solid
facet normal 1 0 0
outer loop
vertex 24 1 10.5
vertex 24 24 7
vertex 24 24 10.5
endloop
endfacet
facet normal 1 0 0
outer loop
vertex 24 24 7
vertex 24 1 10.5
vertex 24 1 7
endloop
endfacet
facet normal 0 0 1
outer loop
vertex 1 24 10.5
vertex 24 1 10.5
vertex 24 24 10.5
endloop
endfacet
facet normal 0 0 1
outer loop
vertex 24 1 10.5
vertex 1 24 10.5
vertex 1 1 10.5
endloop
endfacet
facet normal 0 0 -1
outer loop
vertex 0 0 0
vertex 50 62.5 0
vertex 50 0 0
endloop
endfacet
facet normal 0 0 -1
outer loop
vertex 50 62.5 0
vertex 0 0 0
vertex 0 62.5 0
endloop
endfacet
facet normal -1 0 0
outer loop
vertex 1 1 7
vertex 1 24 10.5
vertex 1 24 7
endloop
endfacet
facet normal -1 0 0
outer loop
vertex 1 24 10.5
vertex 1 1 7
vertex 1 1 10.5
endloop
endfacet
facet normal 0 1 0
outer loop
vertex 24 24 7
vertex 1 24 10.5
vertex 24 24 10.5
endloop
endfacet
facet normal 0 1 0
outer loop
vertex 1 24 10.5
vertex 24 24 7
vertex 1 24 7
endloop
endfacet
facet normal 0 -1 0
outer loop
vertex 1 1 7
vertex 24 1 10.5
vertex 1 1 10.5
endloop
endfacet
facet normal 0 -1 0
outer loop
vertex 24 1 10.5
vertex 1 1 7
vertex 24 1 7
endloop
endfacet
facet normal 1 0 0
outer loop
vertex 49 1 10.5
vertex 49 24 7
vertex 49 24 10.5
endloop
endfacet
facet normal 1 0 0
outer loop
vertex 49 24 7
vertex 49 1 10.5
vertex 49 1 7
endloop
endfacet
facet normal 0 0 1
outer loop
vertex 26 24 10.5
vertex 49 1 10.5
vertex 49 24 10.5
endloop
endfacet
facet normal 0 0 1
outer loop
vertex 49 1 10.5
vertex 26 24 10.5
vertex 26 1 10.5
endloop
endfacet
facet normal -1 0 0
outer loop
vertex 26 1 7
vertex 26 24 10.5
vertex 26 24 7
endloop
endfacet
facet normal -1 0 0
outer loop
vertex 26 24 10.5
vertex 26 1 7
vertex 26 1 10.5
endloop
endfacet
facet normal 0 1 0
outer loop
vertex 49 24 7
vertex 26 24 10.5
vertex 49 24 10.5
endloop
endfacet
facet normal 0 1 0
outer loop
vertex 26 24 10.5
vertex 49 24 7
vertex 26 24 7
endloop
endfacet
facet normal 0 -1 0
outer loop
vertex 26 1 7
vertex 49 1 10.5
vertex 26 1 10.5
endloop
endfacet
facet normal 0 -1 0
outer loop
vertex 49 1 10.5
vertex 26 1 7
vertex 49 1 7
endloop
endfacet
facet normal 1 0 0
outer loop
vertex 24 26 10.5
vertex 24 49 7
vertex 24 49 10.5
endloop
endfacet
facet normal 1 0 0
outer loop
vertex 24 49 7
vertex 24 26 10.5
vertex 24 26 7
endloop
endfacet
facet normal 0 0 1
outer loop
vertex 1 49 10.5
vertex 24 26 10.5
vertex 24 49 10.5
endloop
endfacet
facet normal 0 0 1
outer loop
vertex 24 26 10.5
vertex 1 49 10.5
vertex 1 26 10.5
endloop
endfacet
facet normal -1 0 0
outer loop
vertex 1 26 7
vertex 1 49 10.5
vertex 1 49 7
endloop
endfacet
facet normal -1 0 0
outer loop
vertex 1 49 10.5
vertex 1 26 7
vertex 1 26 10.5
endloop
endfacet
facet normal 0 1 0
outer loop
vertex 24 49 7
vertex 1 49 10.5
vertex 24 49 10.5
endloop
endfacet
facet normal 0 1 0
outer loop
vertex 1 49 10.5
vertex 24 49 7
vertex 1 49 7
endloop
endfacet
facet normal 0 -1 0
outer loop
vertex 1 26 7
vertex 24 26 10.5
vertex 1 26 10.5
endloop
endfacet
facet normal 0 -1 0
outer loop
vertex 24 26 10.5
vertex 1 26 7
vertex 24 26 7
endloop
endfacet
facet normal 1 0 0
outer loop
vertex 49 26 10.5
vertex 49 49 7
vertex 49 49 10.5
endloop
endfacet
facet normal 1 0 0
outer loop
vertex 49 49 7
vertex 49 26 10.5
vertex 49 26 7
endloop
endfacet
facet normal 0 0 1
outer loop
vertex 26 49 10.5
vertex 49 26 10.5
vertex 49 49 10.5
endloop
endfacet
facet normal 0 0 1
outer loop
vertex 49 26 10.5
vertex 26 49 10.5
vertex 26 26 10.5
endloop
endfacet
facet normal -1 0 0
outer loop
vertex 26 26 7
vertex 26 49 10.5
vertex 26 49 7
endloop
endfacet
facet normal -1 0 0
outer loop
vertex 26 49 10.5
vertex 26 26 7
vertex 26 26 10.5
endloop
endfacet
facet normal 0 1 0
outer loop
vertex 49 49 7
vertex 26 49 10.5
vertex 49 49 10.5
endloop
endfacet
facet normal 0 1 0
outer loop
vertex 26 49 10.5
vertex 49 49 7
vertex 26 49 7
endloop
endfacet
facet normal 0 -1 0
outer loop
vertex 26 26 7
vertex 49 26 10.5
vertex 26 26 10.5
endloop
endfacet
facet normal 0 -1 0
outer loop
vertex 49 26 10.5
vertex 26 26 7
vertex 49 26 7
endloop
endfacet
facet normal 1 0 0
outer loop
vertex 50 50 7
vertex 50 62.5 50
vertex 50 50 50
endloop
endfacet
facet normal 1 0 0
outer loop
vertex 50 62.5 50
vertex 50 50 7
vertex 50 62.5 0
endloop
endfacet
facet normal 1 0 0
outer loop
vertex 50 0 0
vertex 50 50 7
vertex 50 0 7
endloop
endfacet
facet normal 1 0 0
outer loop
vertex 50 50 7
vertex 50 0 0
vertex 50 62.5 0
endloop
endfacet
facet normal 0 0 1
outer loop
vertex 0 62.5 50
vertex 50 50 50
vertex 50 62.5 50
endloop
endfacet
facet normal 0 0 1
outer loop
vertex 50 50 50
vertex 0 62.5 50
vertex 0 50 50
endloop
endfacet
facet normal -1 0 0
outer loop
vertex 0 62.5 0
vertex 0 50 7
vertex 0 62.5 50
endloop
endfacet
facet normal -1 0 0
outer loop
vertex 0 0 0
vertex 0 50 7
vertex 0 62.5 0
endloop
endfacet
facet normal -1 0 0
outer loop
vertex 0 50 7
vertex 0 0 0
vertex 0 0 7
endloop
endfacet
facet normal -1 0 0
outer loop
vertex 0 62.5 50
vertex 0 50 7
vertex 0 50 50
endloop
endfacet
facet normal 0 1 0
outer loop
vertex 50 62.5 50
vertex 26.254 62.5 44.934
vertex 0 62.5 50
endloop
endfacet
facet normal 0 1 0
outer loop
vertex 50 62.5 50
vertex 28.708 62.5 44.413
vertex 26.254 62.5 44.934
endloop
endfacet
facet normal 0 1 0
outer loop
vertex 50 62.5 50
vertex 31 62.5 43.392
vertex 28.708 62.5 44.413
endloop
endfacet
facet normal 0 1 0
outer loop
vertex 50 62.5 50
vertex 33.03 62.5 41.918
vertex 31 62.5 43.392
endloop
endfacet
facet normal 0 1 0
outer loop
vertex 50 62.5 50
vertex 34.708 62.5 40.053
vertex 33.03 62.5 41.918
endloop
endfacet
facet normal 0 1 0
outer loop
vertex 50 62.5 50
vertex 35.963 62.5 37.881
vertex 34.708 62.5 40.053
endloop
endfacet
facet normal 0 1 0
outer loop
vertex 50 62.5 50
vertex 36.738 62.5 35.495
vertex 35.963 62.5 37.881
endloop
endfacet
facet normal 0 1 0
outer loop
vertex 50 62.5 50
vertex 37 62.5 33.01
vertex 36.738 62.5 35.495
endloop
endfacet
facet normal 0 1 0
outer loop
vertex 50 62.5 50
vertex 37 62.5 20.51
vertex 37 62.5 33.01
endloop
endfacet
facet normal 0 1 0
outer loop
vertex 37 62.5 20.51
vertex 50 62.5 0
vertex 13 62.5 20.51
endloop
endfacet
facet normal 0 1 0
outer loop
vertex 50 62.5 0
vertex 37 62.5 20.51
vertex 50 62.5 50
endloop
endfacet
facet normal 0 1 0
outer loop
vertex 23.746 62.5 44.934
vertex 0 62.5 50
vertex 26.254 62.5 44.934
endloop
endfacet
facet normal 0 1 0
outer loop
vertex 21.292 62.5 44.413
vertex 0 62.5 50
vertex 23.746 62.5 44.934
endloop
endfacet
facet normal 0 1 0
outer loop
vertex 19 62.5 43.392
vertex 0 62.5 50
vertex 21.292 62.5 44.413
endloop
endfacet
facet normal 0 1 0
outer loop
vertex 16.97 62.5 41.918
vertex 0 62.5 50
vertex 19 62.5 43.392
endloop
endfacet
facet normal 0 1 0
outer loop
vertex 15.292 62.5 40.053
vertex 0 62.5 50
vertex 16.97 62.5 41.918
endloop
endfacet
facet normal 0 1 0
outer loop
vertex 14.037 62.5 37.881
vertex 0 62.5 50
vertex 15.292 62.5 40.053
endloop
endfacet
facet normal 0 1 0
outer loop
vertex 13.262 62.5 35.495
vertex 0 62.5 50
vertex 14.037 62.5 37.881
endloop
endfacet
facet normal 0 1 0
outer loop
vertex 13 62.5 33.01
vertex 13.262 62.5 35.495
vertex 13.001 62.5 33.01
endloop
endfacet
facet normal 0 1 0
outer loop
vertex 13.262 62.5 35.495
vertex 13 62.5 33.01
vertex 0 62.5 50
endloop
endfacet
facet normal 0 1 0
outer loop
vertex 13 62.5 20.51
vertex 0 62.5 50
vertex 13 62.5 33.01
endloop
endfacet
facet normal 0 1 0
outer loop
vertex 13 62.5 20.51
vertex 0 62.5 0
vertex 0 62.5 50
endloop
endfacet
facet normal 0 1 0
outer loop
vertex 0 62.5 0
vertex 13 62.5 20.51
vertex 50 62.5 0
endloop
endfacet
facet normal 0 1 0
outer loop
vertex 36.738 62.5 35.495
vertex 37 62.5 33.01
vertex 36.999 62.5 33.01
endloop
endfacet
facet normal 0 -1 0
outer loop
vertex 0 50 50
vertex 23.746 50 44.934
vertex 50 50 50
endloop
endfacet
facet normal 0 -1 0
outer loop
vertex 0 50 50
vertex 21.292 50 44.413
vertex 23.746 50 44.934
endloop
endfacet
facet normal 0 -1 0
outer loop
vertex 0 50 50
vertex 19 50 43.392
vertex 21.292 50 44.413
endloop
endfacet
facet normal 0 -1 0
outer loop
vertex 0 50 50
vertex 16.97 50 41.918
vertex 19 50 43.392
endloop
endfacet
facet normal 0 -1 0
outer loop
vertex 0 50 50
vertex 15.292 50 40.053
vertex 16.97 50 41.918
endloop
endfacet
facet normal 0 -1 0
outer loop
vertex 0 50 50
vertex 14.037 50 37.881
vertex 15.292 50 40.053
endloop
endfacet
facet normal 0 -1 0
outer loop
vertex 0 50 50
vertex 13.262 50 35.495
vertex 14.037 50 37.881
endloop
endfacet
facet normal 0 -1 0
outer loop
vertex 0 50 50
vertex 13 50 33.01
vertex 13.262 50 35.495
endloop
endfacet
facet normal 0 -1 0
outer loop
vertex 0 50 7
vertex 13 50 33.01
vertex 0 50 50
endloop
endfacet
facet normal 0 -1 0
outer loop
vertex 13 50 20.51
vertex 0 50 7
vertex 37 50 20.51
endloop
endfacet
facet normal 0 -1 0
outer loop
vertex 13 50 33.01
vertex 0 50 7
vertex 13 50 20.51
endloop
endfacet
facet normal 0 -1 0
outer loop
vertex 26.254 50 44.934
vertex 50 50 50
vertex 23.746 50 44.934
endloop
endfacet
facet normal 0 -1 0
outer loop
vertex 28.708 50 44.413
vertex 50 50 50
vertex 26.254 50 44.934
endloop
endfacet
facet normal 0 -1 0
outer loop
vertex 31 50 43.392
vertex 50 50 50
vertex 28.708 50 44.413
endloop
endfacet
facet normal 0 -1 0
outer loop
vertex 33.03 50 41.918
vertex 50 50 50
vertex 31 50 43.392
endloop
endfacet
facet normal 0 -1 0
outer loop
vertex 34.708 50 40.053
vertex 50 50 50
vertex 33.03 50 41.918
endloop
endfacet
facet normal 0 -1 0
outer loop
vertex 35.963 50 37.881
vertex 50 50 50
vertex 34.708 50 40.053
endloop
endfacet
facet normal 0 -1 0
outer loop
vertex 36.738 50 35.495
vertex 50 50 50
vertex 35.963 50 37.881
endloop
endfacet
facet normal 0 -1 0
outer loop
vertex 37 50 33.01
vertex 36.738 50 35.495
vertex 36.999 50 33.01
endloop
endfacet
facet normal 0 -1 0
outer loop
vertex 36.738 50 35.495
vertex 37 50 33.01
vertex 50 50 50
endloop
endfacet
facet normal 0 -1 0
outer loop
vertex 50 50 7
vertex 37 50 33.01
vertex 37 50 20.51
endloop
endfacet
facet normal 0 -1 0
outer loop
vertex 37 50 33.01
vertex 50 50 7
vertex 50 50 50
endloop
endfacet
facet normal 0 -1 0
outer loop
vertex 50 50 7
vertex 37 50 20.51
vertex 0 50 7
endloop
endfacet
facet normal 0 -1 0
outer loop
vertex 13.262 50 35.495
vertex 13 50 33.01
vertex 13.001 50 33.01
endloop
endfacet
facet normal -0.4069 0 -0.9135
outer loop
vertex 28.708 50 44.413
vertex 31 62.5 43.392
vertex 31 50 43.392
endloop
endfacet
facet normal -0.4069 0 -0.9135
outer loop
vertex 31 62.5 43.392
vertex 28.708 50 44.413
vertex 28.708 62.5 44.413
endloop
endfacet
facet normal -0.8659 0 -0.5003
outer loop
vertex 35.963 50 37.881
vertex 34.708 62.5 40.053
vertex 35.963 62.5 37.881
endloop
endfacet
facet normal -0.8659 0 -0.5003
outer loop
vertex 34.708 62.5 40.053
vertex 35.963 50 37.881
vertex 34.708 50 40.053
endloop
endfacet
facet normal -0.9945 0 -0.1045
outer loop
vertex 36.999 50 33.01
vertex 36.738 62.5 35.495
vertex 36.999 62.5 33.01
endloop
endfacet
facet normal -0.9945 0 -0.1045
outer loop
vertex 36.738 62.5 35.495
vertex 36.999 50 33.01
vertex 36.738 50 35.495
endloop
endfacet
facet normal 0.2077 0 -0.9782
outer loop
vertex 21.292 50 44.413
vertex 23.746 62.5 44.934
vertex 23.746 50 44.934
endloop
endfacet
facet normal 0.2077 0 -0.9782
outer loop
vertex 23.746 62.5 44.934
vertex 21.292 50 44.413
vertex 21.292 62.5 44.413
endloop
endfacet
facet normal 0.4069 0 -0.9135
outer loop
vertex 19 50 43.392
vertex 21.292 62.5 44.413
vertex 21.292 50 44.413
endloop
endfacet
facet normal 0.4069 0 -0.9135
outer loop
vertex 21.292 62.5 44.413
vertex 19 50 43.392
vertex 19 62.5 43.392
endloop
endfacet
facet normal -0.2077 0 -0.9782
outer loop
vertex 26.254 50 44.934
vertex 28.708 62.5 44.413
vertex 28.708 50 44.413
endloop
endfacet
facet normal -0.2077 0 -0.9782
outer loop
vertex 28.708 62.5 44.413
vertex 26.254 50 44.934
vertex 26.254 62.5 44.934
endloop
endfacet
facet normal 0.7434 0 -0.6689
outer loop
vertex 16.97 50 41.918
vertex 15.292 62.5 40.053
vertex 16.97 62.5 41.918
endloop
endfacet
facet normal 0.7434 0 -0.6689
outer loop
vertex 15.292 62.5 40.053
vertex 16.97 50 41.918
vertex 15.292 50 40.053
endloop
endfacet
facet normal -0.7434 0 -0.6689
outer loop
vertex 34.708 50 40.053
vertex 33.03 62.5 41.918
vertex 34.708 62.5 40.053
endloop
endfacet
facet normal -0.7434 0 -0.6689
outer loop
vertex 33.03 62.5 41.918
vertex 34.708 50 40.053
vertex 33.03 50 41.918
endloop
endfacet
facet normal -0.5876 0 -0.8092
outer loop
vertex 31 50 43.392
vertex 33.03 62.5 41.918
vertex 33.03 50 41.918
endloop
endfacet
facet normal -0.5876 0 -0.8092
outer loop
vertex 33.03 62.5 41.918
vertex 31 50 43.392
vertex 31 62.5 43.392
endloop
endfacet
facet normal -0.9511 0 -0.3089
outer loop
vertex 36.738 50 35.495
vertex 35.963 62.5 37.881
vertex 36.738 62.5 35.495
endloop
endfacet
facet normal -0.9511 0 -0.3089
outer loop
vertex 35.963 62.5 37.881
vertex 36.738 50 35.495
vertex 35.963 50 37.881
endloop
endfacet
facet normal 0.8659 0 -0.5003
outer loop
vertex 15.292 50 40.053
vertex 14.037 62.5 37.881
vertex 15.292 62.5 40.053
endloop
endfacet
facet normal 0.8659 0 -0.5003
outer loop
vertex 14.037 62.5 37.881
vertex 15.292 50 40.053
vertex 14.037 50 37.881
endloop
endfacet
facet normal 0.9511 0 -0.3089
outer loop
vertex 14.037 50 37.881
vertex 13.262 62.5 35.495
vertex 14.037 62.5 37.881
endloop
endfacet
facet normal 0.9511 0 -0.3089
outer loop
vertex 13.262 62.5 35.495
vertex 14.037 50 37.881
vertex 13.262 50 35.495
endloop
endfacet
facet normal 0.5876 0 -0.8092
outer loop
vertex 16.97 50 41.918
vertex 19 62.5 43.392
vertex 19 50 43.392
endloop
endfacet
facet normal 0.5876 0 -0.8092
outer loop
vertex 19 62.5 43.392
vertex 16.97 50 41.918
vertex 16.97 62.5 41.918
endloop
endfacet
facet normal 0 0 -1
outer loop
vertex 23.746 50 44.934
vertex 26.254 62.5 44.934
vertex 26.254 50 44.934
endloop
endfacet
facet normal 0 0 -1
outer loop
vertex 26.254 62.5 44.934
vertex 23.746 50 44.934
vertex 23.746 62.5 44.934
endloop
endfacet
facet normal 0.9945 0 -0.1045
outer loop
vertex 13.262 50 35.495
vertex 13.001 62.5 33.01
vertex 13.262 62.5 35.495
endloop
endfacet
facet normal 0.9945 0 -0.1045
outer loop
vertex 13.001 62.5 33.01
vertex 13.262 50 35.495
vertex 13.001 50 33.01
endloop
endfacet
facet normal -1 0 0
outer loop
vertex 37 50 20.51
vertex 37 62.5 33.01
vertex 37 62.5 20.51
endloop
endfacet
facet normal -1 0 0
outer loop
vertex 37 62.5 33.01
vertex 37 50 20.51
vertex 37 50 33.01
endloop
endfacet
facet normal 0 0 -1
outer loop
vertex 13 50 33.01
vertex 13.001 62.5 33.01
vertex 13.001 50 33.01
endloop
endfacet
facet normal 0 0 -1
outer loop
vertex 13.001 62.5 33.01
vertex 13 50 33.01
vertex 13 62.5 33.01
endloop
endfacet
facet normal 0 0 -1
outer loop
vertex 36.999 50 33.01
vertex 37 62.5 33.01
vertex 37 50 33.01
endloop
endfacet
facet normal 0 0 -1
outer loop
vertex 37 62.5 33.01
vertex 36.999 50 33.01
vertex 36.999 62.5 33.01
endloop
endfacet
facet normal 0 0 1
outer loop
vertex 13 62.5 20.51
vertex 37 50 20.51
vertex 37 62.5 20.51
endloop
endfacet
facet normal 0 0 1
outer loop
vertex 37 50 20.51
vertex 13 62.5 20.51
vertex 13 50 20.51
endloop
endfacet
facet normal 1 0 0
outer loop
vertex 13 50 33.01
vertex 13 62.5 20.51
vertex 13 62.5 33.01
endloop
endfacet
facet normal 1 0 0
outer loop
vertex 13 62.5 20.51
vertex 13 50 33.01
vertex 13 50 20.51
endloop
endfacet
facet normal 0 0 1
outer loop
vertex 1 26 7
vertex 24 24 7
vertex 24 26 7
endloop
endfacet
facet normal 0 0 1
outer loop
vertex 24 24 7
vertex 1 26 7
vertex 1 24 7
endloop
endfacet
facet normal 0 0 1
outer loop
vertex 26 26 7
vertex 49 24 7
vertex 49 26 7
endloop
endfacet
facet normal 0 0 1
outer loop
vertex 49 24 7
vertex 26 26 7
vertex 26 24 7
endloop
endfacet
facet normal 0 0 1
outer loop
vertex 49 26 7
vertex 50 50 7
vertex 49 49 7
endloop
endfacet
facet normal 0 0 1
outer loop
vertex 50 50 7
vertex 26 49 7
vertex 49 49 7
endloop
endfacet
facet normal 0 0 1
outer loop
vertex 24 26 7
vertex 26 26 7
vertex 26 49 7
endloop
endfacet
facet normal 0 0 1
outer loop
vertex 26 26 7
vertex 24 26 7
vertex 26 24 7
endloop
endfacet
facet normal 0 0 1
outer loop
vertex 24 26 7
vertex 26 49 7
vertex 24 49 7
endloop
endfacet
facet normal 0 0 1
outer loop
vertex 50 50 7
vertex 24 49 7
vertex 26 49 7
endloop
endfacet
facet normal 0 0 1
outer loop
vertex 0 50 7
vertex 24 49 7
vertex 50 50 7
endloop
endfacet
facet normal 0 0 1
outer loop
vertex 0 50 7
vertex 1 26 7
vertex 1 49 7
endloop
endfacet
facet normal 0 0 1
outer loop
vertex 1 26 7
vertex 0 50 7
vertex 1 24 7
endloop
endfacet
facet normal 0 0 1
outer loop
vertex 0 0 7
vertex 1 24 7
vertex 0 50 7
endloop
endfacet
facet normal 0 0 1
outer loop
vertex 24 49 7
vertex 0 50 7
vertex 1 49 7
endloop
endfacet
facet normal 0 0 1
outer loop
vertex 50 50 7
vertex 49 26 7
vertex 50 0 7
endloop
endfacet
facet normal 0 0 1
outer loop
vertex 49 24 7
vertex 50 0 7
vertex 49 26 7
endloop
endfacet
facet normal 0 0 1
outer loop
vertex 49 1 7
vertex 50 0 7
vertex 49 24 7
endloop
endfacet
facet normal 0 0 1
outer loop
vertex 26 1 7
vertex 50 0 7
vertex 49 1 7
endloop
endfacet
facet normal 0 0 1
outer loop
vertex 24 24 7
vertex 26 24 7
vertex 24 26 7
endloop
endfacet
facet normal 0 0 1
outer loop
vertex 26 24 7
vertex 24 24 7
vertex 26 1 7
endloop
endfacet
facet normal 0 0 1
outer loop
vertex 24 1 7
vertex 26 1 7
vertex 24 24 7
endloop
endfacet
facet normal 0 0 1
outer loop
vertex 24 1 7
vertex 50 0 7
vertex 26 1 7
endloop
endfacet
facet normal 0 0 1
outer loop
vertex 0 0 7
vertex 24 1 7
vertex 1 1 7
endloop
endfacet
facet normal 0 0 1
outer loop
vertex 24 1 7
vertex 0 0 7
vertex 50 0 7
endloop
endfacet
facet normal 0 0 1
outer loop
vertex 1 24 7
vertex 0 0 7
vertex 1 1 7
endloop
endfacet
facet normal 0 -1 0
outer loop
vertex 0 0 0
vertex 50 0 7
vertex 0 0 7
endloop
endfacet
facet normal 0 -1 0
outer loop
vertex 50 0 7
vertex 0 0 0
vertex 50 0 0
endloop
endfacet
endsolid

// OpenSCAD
color("LightGray") {
    translate([1,1,0]) cube([23,23,6+4.5]);
    translate([25+1,1,0]) cube([23,23,6+4.5]);
    translate([1,25+1,0]) cube([23,23,6+4.5]);
    translate([25+1,25+1,0]) cube([23,23,6+4.5]);
}
color("Grey") {
    cube([50,50,6+1]);
    difference() {
        translate([0,50,0]) cube([50,12.5,50]);
        translate([25,25,6+27]) rotate([-90,0,0]) cylinder(50,12,12);
        translate([13,25,6+4.51+10]) cube([24,50,27-4.5-10]);
    }
}
